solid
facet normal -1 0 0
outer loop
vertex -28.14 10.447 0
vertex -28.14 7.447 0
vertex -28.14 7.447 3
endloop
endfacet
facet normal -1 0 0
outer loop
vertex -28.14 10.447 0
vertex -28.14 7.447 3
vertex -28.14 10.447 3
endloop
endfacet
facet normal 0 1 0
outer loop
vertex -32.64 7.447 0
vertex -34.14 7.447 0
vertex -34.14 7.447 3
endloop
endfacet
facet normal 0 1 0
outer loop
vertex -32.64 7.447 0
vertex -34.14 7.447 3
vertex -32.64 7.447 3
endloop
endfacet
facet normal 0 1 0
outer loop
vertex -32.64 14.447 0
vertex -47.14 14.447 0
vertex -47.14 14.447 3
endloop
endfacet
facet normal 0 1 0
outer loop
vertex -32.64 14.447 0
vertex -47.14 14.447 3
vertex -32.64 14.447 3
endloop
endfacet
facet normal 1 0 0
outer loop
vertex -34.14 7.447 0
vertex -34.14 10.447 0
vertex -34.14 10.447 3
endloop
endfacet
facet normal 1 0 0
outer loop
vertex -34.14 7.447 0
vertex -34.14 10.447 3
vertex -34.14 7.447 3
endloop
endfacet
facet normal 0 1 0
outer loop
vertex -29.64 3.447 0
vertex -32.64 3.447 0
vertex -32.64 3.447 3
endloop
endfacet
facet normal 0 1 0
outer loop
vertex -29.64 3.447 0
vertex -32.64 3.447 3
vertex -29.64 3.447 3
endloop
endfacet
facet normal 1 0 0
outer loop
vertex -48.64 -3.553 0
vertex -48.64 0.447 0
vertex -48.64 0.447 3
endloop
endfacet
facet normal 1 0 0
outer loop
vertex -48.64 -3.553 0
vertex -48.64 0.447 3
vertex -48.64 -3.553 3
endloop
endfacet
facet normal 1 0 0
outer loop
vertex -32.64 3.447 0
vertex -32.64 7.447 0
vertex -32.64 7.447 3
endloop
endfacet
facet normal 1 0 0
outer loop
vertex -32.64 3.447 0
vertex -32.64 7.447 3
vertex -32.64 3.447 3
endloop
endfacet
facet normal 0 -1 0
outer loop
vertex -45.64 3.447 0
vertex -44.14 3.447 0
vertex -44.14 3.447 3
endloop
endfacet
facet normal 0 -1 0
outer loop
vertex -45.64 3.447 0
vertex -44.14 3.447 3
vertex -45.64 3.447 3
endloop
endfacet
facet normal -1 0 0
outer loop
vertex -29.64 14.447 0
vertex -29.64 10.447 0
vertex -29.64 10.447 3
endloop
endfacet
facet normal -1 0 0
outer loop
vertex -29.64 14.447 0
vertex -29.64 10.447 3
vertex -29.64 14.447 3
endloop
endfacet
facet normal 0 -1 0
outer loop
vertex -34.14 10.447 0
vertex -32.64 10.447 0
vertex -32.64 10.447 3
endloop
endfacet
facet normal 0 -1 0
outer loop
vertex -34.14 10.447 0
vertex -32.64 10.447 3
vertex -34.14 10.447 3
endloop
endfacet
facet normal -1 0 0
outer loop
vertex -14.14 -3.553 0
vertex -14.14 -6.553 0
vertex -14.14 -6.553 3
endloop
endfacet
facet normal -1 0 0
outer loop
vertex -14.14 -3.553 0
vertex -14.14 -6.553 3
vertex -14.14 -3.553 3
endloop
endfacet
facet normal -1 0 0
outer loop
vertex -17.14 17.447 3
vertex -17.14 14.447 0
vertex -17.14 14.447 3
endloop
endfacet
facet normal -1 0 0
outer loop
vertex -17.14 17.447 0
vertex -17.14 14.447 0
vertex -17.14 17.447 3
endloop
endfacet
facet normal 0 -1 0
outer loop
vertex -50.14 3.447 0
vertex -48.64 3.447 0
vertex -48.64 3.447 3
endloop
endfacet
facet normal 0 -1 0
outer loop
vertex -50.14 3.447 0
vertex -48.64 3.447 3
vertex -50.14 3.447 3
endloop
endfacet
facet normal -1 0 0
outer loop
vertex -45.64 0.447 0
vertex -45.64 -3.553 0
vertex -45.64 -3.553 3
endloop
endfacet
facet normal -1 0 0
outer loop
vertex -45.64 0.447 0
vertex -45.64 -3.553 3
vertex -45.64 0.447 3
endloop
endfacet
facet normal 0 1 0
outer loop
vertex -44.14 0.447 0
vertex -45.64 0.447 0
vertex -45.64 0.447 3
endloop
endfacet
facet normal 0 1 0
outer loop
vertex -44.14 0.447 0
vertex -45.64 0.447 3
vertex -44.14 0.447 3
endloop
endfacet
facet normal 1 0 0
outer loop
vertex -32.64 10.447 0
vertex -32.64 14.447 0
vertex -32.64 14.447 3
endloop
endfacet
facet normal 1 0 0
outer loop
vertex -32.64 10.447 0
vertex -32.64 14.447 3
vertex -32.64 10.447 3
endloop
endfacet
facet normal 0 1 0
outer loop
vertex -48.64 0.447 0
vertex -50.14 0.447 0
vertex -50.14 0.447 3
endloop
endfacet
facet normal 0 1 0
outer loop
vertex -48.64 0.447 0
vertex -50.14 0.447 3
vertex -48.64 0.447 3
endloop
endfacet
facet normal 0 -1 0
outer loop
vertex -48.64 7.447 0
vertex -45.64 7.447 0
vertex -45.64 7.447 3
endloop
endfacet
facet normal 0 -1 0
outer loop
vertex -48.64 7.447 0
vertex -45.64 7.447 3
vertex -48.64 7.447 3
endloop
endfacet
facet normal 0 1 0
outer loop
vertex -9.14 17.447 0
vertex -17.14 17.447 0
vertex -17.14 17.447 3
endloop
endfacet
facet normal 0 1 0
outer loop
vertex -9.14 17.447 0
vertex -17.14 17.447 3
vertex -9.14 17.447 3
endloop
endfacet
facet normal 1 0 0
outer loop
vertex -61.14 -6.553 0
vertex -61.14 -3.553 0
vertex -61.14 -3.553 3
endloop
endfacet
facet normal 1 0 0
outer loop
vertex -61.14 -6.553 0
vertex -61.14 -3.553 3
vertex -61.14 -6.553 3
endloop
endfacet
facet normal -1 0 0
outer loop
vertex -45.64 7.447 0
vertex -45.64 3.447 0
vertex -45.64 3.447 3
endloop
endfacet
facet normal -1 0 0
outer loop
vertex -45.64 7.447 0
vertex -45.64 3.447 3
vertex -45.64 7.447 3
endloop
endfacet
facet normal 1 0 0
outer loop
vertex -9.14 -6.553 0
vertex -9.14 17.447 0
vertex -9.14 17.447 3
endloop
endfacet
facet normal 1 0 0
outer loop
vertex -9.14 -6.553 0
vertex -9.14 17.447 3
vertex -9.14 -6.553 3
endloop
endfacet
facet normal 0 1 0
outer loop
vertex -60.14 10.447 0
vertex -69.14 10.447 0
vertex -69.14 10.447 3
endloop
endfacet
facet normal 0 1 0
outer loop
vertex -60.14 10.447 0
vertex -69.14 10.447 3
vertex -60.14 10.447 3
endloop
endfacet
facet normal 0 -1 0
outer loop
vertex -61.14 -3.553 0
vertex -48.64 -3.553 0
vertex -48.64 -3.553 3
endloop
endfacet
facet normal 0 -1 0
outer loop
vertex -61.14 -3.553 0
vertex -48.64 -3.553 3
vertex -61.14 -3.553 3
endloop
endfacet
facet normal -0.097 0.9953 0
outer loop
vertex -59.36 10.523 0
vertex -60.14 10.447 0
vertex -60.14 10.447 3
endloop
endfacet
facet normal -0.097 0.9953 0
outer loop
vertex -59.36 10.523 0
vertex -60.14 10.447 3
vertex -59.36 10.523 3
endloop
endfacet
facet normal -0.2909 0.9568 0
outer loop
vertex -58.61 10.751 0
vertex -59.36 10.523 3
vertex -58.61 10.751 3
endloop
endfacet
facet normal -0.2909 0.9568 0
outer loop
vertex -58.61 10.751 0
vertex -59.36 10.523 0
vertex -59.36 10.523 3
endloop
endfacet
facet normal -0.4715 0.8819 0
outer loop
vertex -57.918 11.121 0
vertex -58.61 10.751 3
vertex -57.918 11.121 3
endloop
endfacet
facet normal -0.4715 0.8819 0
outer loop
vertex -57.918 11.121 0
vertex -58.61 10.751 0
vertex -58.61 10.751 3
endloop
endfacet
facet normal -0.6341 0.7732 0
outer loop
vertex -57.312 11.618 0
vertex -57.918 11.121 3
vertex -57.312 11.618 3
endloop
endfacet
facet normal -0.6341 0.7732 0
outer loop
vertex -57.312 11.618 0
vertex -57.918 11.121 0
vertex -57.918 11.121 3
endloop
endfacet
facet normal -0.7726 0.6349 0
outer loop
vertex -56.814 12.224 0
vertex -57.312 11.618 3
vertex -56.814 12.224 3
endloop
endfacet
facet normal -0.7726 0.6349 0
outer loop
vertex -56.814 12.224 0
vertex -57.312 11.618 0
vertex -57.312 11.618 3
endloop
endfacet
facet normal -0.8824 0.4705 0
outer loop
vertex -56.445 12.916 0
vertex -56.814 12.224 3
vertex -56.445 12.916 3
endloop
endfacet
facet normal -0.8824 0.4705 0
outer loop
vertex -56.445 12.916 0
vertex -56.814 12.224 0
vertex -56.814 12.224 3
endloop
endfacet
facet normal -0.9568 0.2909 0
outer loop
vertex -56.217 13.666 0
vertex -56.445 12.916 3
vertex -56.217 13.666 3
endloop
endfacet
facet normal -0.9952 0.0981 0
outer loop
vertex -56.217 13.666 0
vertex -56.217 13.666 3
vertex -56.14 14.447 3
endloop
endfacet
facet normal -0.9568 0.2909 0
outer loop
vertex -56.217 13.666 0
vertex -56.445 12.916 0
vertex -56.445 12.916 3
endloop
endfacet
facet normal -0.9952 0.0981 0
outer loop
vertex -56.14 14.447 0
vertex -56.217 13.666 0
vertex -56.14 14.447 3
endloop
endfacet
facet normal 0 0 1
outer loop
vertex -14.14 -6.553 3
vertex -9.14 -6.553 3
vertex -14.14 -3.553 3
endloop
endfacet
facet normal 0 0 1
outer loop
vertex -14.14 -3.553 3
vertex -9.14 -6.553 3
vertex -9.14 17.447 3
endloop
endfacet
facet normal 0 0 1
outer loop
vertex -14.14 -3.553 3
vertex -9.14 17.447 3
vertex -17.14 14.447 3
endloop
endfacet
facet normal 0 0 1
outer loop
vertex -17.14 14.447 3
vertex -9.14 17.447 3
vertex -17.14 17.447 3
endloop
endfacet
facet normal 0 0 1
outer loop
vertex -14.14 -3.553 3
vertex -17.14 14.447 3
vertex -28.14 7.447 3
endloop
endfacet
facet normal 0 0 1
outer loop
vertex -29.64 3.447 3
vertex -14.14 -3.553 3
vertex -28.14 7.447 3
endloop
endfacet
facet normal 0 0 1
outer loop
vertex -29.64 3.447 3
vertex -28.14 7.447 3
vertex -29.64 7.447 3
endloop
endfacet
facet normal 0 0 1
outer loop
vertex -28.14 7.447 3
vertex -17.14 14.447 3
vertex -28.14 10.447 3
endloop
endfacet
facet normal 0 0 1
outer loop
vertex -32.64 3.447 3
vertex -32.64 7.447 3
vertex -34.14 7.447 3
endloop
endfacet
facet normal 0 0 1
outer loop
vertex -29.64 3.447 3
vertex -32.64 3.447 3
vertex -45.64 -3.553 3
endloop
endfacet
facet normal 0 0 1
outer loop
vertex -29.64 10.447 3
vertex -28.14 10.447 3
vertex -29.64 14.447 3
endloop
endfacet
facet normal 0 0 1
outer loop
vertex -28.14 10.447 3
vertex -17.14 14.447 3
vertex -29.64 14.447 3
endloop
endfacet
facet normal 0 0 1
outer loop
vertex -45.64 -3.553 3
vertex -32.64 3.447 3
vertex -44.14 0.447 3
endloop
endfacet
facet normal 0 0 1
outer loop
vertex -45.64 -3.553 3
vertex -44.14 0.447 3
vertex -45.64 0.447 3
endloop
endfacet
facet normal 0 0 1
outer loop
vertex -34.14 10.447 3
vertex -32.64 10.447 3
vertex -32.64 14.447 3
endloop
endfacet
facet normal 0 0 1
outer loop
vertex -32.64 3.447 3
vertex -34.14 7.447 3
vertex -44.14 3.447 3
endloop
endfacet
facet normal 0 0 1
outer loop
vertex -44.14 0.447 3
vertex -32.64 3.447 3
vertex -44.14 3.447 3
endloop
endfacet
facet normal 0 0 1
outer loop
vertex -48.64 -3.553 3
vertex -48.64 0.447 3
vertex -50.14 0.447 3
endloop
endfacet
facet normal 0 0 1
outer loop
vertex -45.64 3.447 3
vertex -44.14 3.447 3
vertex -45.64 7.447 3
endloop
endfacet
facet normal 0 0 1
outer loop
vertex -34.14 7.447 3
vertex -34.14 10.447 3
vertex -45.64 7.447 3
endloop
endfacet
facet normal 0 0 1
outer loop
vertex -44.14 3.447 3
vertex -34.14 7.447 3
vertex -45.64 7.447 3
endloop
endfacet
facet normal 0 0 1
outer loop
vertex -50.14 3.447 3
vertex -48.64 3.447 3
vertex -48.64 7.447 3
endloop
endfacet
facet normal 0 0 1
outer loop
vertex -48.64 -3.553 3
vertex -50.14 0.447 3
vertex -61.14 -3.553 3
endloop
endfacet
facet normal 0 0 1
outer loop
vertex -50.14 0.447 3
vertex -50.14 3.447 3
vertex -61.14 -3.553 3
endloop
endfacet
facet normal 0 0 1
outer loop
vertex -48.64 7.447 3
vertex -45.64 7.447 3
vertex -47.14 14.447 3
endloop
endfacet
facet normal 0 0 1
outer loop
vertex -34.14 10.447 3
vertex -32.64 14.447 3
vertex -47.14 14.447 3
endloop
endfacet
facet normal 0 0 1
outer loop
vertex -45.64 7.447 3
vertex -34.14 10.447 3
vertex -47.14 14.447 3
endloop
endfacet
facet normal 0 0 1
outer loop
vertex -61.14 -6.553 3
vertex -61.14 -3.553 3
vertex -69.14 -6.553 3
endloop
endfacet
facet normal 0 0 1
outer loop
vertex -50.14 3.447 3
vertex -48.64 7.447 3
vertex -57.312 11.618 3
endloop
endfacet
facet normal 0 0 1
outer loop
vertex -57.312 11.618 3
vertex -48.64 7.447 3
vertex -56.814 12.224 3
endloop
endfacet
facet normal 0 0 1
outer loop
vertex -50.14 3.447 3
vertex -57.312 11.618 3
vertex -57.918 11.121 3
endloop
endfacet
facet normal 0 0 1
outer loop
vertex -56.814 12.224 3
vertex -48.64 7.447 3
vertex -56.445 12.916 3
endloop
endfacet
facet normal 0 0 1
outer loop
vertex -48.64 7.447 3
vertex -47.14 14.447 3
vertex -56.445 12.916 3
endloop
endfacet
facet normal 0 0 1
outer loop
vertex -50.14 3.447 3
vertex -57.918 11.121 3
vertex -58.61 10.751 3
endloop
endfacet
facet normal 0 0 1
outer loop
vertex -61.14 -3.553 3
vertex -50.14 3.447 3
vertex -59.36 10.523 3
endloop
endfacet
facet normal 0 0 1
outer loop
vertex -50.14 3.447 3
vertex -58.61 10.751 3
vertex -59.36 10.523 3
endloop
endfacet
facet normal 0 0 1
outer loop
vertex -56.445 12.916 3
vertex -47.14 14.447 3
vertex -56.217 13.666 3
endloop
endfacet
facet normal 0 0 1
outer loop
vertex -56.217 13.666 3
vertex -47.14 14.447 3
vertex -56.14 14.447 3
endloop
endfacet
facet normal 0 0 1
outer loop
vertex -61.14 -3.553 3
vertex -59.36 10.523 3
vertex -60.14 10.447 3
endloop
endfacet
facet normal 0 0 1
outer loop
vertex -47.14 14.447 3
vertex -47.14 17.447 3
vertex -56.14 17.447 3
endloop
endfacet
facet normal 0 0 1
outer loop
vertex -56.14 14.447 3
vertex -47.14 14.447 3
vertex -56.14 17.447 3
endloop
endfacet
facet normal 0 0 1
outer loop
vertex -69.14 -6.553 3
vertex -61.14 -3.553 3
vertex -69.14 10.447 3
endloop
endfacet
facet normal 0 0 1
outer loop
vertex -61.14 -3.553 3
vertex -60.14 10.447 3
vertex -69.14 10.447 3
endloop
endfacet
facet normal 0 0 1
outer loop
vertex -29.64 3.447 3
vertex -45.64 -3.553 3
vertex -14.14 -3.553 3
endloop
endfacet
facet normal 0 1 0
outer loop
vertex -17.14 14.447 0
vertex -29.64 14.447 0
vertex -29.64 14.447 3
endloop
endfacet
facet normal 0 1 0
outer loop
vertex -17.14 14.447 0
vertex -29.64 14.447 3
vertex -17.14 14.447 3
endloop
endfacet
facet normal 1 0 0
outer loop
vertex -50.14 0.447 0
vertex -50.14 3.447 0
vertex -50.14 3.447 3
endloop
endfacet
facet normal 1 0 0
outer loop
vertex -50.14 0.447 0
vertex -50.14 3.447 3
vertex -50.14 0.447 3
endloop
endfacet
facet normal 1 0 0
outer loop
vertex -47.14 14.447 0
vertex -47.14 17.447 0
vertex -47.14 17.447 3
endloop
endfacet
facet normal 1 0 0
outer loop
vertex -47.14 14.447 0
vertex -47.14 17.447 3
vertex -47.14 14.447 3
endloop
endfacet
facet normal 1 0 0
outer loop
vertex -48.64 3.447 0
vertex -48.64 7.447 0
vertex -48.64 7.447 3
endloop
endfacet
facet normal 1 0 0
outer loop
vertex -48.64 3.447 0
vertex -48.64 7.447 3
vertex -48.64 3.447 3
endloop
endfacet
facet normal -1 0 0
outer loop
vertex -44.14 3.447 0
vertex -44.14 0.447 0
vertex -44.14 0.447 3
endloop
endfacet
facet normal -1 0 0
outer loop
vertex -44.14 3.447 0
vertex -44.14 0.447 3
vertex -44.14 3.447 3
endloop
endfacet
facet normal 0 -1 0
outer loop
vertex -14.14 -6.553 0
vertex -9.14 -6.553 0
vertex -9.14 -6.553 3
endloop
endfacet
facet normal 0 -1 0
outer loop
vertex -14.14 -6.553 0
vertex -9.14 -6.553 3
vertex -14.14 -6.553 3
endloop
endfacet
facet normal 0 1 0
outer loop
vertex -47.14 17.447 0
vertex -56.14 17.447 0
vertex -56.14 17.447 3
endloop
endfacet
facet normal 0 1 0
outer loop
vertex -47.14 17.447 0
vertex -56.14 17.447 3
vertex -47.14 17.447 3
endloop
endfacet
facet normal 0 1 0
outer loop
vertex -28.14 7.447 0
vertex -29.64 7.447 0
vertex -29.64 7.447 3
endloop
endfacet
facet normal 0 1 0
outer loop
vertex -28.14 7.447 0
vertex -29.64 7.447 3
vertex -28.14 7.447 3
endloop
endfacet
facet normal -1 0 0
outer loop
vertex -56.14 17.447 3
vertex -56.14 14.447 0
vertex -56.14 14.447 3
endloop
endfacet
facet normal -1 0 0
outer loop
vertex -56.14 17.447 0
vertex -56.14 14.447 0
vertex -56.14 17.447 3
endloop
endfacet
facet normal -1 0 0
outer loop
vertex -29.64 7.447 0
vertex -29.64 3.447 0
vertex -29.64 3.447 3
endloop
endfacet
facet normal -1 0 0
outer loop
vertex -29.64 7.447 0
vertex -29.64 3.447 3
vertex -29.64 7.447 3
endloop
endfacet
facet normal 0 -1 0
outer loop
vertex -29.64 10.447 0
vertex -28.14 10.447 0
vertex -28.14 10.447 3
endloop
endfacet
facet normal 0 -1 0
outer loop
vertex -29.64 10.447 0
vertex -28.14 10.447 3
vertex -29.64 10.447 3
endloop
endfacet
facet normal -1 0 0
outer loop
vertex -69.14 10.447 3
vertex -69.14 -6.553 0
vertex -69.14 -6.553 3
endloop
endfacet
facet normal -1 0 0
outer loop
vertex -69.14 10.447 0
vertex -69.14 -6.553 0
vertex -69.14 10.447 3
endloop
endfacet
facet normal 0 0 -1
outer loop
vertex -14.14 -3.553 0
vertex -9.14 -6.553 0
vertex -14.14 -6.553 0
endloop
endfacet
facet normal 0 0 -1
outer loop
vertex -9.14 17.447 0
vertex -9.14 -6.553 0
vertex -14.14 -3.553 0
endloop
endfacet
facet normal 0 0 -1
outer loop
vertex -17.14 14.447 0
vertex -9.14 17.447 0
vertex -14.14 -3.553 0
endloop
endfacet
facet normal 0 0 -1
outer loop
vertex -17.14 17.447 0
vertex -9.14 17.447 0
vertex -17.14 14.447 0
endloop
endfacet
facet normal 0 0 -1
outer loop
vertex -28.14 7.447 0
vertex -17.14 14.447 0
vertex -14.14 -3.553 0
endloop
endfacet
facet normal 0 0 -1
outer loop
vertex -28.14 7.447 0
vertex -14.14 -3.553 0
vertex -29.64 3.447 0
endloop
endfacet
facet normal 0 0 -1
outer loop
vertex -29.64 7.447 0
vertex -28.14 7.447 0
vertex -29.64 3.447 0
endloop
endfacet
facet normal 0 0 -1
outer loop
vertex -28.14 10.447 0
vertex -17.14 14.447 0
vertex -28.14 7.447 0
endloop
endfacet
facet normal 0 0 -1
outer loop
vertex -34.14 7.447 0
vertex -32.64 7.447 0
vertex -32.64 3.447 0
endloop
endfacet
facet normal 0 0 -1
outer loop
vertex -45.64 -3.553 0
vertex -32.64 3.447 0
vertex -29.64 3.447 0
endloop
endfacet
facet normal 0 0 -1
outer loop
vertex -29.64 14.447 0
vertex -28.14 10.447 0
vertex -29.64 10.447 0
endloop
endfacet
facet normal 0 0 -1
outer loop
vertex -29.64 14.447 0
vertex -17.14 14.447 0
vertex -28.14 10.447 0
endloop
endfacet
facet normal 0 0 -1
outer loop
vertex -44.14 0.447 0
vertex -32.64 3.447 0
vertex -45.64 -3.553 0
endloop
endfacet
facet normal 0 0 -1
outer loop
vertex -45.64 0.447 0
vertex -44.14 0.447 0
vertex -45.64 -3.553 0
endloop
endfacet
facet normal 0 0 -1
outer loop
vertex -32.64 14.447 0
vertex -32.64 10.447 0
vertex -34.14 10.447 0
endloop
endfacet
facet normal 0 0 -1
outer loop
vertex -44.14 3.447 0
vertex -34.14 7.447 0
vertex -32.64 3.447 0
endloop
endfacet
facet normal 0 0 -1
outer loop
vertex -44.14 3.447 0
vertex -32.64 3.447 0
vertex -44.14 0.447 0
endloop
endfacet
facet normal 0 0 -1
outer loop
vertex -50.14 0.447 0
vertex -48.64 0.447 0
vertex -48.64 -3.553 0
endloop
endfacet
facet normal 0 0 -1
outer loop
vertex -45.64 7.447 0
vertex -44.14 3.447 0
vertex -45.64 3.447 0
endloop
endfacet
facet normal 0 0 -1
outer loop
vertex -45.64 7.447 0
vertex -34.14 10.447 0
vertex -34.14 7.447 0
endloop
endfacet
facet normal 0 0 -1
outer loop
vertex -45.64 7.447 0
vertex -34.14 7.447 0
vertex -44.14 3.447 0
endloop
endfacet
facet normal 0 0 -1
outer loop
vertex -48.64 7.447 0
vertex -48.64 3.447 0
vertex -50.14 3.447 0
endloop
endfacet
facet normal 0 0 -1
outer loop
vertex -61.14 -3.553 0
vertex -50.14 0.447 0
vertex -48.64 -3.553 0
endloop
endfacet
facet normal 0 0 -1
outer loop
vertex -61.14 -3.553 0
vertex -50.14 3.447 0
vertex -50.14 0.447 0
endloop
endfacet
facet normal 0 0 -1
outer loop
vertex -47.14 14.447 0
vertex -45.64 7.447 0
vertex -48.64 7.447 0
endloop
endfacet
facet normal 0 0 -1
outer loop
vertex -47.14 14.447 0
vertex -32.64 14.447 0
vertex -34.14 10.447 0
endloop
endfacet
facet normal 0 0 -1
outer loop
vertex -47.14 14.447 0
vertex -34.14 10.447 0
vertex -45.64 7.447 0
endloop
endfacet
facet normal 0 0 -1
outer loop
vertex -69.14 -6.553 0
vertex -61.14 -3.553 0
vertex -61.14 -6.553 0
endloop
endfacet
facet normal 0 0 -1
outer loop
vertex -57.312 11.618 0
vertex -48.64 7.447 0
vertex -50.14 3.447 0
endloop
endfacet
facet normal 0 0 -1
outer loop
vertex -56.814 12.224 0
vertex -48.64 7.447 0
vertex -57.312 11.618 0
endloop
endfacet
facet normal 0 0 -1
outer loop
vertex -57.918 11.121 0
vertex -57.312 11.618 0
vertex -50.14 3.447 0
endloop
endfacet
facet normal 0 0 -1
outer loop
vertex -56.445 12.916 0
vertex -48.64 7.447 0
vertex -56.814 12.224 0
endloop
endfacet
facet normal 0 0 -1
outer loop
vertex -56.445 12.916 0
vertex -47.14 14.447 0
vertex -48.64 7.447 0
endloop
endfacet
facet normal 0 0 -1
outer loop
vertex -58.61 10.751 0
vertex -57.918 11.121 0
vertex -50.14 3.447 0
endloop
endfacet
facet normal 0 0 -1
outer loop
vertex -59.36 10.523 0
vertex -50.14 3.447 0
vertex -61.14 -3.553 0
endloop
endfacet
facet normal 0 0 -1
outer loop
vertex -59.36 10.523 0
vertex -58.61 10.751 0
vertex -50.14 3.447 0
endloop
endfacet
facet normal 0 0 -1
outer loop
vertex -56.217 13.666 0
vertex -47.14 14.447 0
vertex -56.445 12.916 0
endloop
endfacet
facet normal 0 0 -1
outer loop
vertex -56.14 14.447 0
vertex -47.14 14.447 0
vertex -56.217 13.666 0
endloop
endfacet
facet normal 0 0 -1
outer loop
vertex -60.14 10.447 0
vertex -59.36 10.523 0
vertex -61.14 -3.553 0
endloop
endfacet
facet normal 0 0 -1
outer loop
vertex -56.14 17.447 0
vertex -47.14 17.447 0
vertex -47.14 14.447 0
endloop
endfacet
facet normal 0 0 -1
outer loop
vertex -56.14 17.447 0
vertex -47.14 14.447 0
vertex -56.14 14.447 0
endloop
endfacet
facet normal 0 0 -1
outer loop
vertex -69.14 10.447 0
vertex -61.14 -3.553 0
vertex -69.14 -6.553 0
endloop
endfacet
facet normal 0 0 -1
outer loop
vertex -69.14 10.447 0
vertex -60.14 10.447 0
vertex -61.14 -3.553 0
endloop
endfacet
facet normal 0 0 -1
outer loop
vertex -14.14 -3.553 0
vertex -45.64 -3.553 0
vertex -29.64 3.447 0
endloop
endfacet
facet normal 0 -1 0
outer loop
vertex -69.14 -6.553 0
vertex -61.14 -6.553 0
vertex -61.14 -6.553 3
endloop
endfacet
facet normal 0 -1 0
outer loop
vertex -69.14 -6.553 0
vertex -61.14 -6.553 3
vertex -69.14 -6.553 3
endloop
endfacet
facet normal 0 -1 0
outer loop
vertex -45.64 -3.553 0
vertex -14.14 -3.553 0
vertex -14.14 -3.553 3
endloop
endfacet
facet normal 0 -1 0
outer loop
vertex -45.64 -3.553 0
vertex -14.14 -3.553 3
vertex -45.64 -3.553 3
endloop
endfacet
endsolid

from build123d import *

# Parameters (mm, degrees)
BOSS_EXTRU_5_DEPTH = 3


with BuildPart() as part:
    # Esquisse5 → Boss.-Extru.5 (new body)
    with BuildSketch(Plane.XY):
        with BuildLine():
            Line((-17.14036809, 14.446568203), (-17.14036809, 17.446568203))
            Line((-17.14036809, 17.446568203), (-9.14036809, 17.446568203))
            Line((-9.14036809, 17.446568203), (-9.14036809, -6.553431797))
            Line((-9.14036809, -6.553431797), (-14.14036809, -6.553431797))
            Line((-14.14036809, -6.553431797), (-14.14036809, -3.553431797))
            Line((-14.14036809, -3.553431797), (-45.64036809, -3.553431797))
            Line((-45.64036809, -3.553431797), (-45.64036809, 0.446568203))
            Line((-45.64036809, 0.446568203), (-44.14036809, 0.446568203))
            Line((-44.14036809, 0.446568203), (-44.14036809, 3.446568203))
            Line((-44.14036809, 3.446568203), (-45.64036809, 3.446568203))
            Line((-45.64036809, 3.446568203), (-45.64036809, 7.446568203))
            Line((-45.64036809, 7.446568203), (-48.64036809, 7.446568203))
            Line((-48.64036809, 7.446568203), (-48.64036809, 3.446568203))
            Line((-48.64036809, 3.446568203), (-50.14036809, 3.446568203))
            Line((-50.14036809, 3.446568203), (-50.14036809, 0.446568203))
            Line((-50.14036809, 0.446568203), (-48.64036809, 0.446568203))
            Line((-48.64036809, 0.446568203), (-48.64036809, -3.553431797))
            Line((-48.64036809, -3.553431797), (-61.14036809, -3.553431797))
            Line((-61.14036809, -3.553431797), (-61.14036809, -6.553431797))
            Line((-61.14036809, -6.553431797), (-69.14036809, -6.553431797))
            Line((-69.14036809, -6.553431797), (-69.14036809, 10.446568203))
            Line((-69.14036809, 10.446568203), (-60.14036809, 10.446568203))
            ThreePointArc((-60.14036809, 10.446568203), (-57.311940966, 11.618141078), (-56.14036809, 14.446568203))
            Line((-56.14036809, 14.446568203), (-56.14036809, 17.446568203))
            Line((-56.14036809, 17.446568203), (-47.14036809, 17.446568203))
            Line((-47.14036809, 17.446568203), (-47.14036809, 14.446568203))
            Line((-47.14036809, 14.446568203), (-32.64036809, 14.446568203))
            Line((-32.64036809, 14.446568203), (-32.64036809, 10.446568203))
            Line((-32.64036809, 10.446568203), (-34.14036809, 10.446568203))
            Line((-34.14036809, 10.446568203), (-34.14036809, 7.446568203))
            Line((-34.14036809, 7.446568203), (-32.64036809, 7.446568203))
            Line((-32.64036809, 7.446568203), (-32.64036809, 3.446568203))
            Line((-32.64036809, 3.446568203), (-29.64036809, 3.446568203))
            Line((-29.64036809, 3.446568203), (-29.64036809, 7.446568203))
            Line((-29.64036809, 7.446568203), (-28.14036809, 7.446568203))
            Line((-28.14036809, 7.446568203), (-28.14036809, 10.446568203))
            Line((-28.14036809, 10.446568203), (-29.64036809, 10.446568203))
            Line((-29.64036809, 10.446568203), (-29.64036809, 14.446568203))
            Line((-29.64036809, 14.446568203), (-17.14036809, 14.446568203))
        make_face()
    extrude(amount=BOSS_EXTRU_5_DEPTH)


solid = part.part
